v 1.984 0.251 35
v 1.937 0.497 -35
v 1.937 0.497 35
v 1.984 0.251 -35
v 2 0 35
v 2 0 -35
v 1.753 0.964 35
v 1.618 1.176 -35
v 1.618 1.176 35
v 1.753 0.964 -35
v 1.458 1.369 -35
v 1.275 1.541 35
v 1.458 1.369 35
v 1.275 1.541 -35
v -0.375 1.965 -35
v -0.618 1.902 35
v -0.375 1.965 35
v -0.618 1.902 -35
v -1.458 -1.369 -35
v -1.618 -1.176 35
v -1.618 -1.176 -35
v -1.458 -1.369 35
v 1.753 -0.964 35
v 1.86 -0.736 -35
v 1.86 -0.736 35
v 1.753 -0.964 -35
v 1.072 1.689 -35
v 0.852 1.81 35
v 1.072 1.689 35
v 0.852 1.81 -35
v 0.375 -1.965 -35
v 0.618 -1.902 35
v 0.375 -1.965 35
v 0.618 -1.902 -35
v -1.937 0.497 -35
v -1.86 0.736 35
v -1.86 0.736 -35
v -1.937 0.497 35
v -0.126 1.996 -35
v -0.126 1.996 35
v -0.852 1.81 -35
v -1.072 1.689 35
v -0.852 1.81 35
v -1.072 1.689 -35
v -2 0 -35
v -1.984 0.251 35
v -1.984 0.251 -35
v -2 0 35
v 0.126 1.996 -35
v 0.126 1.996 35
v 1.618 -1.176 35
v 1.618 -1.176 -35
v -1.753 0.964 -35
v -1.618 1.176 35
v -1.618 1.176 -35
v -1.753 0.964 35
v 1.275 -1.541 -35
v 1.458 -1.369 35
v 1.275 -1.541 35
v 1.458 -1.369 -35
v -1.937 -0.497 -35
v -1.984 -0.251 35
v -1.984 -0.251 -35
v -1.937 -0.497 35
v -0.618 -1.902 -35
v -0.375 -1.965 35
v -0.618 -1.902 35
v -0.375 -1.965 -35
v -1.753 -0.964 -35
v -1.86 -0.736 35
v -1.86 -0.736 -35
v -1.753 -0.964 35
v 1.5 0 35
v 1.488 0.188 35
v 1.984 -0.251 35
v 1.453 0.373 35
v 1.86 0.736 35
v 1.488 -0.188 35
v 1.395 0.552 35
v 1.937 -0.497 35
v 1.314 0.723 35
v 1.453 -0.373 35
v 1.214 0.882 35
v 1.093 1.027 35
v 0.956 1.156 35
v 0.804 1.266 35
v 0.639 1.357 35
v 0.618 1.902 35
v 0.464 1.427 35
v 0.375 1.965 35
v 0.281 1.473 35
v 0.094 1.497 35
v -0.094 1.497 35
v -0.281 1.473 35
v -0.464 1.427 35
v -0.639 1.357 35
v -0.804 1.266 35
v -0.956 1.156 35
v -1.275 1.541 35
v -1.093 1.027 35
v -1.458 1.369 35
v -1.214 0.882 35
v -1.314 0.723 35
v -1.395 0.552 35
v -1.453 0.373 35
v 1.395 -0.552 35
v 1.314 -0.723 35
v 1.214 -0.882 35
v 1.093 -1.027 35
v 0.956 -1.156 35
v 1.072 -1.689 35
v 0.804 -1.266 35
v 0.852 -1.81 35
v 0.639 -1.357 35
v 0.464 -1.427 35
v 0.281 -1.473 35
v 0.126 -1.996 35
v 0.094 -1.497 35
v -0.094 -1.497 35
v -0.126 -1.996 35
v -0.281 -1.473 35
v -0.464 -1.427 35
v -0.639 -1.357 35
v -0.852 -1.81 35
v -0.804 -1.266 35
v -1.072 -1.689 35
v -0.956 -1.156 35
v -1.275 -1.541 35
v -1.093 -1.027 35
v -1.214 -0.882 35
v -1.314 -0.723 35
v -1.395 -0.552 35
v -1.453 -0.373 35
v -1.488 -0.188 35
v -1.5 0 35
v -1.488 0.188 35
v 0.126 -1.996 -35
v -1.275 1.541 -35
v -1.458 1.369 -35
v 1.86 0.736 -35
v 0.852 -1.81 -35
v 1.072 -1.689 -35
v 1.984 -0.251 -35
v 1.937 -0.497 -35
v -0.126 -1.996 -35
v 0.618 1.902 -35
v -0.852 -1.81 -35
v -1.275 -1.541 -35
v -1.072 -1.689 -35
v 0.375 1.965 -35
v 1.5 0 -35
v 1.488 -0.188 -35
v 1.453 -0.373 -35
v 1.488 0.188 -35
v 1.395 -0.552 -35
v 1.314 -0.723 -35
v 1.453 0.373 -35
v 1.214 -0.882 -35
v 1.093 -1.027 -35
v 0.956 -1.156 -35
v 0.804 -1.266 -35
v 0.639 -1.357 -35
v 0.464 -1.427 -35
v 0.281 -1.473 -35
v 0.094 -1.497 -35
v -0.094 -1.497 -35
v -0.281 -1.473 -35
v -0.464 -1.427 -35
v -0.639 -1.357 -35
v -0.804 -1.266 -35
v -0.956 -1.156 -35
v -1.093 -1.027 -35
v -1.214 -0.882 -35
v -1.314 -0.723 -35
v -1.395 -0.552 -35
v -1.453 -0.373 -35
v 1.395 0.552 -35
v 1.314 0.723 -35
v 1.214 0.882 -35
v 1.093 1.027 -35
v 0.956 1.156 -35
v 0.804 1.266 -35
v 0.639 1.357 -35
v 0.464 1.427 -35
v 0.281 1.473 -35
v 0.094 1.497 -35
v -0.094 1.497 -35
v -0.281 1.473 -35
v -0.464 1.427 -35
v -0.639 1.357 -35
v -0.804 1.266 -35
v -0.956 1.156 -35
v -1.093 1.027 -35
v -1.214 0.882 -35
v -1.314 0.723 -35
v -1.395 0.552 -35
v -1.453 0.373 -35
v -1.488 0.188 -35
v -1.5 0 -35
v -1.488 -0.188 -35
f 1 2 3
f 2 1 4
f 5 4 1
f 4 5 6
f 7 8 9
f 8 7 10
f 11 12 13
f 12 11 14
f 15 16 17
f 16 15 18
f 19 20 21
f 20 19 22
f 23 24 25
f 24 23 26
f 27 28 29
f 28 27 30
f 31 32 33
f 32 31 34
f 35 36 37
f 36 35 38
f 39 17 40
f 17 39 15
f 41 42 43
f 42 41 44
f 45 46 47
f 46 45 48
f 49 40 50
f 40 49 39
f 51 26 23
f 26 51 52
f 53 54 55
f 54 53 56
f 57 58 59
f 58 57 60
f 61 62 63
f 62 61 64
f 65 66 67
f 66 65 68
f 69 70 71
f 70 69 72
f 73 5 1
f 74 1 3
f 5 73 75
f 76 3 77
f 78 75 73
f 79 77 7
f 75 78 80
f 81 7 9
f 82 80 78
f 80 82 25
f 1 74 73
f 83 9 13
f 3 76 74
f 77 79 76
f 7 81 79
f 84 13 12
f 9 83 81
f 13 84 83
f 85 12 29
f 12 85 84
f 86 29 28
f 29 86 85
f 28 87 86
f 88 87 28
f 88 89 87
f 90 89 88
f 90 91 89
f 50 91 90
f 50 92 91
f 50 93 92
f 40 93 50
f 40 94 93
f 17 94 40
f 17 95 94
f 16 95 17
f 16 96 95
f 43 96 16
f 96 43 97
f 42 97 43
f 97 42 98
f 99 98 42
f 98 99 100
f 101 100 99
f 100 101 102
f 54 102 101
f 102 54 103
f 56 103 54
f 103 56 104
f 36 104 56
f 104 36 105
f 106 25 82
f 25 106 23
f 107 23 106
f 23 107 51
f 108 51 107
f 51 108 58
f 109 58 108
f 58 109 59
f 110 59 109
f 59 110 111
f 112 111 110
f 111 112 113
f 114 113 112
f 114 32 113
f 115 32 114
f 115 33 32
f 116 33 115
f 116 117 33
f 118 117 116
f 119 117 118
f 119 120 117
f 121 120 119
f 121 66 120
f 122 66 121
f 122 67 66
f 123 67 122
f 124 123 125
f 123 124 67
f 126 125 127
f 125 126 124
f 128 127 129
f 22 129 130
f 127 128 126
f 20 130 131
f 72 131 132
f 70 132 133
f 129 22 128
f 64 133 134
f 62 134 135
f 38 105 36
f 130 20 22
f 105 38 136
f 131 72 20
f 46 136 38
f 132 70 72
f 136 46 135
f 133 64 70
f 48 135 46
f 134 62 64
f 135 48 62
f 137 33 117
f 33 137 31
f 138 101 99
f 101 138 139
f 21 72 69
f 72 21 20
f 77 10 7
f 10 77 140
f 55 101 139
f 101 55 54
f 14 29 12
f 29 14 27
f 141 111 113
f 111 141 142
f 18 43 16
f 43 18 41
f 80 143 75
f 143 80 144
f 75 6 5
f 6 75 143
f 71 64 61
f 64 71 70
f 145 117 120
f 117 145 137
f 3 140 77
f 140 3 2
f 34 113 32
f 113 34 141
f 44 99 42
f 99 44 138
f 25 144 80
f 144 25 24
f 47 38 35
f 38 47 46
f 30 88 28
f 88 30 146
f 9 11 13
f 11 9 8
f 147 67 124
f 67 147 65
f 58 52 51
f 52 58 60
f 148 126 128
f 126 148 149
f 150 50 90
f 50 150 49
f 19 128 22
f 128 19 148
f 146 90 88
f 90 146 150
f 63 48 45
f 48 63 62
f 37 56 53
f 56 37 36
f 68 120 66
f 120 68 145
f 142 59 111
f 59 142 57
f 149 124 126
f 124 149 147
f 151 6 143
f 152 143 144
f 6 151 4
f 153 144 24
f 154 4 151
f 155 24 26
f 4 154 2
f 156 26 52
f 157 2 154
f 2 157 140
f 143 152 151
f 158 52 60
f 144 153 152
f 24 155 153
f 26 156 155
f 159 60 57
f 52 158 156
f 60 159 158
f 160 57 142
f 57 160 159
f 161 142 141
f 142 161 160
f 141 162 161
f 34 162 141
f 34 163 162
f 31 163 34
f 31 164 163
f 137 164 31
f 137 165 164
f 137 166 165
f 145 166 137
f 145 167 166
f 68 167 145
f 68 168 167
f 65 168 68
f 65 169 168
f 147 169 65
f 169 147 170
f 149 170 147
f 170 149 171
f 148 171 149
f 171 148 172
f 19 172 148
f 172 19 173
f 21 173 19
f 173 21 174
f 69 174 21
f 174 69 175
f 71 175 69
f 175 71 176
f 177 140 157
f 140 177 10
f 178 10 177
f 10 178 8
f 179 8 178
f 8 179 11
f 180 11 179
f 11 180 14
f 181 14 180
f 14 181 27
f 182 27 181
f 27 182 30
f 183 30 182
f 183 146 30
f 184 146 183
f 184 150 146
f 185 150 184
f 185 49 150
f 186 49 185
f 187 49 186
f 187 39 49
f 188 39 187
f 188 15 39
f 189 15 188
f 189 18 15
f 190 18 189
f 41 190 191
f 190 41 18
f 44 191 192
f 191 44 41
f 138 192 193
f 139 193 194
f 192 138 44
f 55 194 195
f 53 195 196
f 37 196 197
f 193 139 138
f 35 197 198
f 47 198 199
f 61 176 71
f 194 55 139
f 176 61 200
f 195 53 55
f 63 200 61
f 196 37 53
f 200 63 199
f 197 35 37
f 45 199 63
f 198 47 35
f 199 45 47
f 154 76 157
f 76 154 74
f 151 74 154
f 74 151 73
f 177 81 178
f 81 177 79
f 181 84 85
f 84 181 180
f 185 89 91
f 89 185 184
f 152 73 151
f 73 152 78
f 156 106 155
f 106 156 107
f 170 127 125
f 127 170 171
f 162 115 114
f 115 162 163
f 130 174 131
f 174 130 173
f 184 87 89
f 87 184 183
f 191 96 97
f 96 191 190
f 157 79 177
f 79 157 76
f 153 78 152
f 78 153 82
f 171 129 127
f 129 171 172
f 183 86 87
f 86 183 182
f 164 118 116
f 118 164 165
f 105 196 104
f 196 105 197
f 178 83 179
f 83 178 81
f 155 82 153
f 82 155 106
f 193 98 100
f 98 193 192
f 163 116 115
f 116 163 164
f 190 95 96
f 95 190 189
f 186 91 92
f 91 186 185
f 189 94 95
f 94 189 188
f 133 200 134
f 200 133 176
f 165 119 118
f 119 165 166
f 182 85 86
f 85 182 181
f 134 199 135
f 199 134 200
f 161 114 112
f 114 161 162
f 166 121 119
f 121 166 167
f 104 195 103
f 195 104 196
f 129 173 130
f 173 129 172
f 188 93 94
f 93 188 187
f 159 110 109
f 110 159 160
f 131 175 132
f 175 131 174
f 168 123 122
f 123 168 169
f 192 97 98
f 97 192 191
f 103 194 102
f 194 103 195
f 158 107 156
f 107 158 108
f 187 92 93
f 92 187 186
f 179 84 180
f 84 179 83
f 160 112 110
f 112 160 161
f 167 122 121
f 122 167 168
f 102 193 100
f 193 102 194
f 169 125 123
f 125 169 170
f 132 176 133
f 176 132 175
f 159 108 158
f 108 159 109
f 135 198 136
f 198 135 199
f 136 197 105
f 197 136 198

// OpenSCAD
$fn = 50;


difference() {
	union() {
		translate(v = [0, 0, -35.0000000000]) {
			cylinder(h = 70, r = 2.0000000000);
		}
	}
	union() {
		translate(v = [0, 0, -100.0000000000]) {
			cylinder(h = 200, r = 1.5000000000);
		}
	}
}
